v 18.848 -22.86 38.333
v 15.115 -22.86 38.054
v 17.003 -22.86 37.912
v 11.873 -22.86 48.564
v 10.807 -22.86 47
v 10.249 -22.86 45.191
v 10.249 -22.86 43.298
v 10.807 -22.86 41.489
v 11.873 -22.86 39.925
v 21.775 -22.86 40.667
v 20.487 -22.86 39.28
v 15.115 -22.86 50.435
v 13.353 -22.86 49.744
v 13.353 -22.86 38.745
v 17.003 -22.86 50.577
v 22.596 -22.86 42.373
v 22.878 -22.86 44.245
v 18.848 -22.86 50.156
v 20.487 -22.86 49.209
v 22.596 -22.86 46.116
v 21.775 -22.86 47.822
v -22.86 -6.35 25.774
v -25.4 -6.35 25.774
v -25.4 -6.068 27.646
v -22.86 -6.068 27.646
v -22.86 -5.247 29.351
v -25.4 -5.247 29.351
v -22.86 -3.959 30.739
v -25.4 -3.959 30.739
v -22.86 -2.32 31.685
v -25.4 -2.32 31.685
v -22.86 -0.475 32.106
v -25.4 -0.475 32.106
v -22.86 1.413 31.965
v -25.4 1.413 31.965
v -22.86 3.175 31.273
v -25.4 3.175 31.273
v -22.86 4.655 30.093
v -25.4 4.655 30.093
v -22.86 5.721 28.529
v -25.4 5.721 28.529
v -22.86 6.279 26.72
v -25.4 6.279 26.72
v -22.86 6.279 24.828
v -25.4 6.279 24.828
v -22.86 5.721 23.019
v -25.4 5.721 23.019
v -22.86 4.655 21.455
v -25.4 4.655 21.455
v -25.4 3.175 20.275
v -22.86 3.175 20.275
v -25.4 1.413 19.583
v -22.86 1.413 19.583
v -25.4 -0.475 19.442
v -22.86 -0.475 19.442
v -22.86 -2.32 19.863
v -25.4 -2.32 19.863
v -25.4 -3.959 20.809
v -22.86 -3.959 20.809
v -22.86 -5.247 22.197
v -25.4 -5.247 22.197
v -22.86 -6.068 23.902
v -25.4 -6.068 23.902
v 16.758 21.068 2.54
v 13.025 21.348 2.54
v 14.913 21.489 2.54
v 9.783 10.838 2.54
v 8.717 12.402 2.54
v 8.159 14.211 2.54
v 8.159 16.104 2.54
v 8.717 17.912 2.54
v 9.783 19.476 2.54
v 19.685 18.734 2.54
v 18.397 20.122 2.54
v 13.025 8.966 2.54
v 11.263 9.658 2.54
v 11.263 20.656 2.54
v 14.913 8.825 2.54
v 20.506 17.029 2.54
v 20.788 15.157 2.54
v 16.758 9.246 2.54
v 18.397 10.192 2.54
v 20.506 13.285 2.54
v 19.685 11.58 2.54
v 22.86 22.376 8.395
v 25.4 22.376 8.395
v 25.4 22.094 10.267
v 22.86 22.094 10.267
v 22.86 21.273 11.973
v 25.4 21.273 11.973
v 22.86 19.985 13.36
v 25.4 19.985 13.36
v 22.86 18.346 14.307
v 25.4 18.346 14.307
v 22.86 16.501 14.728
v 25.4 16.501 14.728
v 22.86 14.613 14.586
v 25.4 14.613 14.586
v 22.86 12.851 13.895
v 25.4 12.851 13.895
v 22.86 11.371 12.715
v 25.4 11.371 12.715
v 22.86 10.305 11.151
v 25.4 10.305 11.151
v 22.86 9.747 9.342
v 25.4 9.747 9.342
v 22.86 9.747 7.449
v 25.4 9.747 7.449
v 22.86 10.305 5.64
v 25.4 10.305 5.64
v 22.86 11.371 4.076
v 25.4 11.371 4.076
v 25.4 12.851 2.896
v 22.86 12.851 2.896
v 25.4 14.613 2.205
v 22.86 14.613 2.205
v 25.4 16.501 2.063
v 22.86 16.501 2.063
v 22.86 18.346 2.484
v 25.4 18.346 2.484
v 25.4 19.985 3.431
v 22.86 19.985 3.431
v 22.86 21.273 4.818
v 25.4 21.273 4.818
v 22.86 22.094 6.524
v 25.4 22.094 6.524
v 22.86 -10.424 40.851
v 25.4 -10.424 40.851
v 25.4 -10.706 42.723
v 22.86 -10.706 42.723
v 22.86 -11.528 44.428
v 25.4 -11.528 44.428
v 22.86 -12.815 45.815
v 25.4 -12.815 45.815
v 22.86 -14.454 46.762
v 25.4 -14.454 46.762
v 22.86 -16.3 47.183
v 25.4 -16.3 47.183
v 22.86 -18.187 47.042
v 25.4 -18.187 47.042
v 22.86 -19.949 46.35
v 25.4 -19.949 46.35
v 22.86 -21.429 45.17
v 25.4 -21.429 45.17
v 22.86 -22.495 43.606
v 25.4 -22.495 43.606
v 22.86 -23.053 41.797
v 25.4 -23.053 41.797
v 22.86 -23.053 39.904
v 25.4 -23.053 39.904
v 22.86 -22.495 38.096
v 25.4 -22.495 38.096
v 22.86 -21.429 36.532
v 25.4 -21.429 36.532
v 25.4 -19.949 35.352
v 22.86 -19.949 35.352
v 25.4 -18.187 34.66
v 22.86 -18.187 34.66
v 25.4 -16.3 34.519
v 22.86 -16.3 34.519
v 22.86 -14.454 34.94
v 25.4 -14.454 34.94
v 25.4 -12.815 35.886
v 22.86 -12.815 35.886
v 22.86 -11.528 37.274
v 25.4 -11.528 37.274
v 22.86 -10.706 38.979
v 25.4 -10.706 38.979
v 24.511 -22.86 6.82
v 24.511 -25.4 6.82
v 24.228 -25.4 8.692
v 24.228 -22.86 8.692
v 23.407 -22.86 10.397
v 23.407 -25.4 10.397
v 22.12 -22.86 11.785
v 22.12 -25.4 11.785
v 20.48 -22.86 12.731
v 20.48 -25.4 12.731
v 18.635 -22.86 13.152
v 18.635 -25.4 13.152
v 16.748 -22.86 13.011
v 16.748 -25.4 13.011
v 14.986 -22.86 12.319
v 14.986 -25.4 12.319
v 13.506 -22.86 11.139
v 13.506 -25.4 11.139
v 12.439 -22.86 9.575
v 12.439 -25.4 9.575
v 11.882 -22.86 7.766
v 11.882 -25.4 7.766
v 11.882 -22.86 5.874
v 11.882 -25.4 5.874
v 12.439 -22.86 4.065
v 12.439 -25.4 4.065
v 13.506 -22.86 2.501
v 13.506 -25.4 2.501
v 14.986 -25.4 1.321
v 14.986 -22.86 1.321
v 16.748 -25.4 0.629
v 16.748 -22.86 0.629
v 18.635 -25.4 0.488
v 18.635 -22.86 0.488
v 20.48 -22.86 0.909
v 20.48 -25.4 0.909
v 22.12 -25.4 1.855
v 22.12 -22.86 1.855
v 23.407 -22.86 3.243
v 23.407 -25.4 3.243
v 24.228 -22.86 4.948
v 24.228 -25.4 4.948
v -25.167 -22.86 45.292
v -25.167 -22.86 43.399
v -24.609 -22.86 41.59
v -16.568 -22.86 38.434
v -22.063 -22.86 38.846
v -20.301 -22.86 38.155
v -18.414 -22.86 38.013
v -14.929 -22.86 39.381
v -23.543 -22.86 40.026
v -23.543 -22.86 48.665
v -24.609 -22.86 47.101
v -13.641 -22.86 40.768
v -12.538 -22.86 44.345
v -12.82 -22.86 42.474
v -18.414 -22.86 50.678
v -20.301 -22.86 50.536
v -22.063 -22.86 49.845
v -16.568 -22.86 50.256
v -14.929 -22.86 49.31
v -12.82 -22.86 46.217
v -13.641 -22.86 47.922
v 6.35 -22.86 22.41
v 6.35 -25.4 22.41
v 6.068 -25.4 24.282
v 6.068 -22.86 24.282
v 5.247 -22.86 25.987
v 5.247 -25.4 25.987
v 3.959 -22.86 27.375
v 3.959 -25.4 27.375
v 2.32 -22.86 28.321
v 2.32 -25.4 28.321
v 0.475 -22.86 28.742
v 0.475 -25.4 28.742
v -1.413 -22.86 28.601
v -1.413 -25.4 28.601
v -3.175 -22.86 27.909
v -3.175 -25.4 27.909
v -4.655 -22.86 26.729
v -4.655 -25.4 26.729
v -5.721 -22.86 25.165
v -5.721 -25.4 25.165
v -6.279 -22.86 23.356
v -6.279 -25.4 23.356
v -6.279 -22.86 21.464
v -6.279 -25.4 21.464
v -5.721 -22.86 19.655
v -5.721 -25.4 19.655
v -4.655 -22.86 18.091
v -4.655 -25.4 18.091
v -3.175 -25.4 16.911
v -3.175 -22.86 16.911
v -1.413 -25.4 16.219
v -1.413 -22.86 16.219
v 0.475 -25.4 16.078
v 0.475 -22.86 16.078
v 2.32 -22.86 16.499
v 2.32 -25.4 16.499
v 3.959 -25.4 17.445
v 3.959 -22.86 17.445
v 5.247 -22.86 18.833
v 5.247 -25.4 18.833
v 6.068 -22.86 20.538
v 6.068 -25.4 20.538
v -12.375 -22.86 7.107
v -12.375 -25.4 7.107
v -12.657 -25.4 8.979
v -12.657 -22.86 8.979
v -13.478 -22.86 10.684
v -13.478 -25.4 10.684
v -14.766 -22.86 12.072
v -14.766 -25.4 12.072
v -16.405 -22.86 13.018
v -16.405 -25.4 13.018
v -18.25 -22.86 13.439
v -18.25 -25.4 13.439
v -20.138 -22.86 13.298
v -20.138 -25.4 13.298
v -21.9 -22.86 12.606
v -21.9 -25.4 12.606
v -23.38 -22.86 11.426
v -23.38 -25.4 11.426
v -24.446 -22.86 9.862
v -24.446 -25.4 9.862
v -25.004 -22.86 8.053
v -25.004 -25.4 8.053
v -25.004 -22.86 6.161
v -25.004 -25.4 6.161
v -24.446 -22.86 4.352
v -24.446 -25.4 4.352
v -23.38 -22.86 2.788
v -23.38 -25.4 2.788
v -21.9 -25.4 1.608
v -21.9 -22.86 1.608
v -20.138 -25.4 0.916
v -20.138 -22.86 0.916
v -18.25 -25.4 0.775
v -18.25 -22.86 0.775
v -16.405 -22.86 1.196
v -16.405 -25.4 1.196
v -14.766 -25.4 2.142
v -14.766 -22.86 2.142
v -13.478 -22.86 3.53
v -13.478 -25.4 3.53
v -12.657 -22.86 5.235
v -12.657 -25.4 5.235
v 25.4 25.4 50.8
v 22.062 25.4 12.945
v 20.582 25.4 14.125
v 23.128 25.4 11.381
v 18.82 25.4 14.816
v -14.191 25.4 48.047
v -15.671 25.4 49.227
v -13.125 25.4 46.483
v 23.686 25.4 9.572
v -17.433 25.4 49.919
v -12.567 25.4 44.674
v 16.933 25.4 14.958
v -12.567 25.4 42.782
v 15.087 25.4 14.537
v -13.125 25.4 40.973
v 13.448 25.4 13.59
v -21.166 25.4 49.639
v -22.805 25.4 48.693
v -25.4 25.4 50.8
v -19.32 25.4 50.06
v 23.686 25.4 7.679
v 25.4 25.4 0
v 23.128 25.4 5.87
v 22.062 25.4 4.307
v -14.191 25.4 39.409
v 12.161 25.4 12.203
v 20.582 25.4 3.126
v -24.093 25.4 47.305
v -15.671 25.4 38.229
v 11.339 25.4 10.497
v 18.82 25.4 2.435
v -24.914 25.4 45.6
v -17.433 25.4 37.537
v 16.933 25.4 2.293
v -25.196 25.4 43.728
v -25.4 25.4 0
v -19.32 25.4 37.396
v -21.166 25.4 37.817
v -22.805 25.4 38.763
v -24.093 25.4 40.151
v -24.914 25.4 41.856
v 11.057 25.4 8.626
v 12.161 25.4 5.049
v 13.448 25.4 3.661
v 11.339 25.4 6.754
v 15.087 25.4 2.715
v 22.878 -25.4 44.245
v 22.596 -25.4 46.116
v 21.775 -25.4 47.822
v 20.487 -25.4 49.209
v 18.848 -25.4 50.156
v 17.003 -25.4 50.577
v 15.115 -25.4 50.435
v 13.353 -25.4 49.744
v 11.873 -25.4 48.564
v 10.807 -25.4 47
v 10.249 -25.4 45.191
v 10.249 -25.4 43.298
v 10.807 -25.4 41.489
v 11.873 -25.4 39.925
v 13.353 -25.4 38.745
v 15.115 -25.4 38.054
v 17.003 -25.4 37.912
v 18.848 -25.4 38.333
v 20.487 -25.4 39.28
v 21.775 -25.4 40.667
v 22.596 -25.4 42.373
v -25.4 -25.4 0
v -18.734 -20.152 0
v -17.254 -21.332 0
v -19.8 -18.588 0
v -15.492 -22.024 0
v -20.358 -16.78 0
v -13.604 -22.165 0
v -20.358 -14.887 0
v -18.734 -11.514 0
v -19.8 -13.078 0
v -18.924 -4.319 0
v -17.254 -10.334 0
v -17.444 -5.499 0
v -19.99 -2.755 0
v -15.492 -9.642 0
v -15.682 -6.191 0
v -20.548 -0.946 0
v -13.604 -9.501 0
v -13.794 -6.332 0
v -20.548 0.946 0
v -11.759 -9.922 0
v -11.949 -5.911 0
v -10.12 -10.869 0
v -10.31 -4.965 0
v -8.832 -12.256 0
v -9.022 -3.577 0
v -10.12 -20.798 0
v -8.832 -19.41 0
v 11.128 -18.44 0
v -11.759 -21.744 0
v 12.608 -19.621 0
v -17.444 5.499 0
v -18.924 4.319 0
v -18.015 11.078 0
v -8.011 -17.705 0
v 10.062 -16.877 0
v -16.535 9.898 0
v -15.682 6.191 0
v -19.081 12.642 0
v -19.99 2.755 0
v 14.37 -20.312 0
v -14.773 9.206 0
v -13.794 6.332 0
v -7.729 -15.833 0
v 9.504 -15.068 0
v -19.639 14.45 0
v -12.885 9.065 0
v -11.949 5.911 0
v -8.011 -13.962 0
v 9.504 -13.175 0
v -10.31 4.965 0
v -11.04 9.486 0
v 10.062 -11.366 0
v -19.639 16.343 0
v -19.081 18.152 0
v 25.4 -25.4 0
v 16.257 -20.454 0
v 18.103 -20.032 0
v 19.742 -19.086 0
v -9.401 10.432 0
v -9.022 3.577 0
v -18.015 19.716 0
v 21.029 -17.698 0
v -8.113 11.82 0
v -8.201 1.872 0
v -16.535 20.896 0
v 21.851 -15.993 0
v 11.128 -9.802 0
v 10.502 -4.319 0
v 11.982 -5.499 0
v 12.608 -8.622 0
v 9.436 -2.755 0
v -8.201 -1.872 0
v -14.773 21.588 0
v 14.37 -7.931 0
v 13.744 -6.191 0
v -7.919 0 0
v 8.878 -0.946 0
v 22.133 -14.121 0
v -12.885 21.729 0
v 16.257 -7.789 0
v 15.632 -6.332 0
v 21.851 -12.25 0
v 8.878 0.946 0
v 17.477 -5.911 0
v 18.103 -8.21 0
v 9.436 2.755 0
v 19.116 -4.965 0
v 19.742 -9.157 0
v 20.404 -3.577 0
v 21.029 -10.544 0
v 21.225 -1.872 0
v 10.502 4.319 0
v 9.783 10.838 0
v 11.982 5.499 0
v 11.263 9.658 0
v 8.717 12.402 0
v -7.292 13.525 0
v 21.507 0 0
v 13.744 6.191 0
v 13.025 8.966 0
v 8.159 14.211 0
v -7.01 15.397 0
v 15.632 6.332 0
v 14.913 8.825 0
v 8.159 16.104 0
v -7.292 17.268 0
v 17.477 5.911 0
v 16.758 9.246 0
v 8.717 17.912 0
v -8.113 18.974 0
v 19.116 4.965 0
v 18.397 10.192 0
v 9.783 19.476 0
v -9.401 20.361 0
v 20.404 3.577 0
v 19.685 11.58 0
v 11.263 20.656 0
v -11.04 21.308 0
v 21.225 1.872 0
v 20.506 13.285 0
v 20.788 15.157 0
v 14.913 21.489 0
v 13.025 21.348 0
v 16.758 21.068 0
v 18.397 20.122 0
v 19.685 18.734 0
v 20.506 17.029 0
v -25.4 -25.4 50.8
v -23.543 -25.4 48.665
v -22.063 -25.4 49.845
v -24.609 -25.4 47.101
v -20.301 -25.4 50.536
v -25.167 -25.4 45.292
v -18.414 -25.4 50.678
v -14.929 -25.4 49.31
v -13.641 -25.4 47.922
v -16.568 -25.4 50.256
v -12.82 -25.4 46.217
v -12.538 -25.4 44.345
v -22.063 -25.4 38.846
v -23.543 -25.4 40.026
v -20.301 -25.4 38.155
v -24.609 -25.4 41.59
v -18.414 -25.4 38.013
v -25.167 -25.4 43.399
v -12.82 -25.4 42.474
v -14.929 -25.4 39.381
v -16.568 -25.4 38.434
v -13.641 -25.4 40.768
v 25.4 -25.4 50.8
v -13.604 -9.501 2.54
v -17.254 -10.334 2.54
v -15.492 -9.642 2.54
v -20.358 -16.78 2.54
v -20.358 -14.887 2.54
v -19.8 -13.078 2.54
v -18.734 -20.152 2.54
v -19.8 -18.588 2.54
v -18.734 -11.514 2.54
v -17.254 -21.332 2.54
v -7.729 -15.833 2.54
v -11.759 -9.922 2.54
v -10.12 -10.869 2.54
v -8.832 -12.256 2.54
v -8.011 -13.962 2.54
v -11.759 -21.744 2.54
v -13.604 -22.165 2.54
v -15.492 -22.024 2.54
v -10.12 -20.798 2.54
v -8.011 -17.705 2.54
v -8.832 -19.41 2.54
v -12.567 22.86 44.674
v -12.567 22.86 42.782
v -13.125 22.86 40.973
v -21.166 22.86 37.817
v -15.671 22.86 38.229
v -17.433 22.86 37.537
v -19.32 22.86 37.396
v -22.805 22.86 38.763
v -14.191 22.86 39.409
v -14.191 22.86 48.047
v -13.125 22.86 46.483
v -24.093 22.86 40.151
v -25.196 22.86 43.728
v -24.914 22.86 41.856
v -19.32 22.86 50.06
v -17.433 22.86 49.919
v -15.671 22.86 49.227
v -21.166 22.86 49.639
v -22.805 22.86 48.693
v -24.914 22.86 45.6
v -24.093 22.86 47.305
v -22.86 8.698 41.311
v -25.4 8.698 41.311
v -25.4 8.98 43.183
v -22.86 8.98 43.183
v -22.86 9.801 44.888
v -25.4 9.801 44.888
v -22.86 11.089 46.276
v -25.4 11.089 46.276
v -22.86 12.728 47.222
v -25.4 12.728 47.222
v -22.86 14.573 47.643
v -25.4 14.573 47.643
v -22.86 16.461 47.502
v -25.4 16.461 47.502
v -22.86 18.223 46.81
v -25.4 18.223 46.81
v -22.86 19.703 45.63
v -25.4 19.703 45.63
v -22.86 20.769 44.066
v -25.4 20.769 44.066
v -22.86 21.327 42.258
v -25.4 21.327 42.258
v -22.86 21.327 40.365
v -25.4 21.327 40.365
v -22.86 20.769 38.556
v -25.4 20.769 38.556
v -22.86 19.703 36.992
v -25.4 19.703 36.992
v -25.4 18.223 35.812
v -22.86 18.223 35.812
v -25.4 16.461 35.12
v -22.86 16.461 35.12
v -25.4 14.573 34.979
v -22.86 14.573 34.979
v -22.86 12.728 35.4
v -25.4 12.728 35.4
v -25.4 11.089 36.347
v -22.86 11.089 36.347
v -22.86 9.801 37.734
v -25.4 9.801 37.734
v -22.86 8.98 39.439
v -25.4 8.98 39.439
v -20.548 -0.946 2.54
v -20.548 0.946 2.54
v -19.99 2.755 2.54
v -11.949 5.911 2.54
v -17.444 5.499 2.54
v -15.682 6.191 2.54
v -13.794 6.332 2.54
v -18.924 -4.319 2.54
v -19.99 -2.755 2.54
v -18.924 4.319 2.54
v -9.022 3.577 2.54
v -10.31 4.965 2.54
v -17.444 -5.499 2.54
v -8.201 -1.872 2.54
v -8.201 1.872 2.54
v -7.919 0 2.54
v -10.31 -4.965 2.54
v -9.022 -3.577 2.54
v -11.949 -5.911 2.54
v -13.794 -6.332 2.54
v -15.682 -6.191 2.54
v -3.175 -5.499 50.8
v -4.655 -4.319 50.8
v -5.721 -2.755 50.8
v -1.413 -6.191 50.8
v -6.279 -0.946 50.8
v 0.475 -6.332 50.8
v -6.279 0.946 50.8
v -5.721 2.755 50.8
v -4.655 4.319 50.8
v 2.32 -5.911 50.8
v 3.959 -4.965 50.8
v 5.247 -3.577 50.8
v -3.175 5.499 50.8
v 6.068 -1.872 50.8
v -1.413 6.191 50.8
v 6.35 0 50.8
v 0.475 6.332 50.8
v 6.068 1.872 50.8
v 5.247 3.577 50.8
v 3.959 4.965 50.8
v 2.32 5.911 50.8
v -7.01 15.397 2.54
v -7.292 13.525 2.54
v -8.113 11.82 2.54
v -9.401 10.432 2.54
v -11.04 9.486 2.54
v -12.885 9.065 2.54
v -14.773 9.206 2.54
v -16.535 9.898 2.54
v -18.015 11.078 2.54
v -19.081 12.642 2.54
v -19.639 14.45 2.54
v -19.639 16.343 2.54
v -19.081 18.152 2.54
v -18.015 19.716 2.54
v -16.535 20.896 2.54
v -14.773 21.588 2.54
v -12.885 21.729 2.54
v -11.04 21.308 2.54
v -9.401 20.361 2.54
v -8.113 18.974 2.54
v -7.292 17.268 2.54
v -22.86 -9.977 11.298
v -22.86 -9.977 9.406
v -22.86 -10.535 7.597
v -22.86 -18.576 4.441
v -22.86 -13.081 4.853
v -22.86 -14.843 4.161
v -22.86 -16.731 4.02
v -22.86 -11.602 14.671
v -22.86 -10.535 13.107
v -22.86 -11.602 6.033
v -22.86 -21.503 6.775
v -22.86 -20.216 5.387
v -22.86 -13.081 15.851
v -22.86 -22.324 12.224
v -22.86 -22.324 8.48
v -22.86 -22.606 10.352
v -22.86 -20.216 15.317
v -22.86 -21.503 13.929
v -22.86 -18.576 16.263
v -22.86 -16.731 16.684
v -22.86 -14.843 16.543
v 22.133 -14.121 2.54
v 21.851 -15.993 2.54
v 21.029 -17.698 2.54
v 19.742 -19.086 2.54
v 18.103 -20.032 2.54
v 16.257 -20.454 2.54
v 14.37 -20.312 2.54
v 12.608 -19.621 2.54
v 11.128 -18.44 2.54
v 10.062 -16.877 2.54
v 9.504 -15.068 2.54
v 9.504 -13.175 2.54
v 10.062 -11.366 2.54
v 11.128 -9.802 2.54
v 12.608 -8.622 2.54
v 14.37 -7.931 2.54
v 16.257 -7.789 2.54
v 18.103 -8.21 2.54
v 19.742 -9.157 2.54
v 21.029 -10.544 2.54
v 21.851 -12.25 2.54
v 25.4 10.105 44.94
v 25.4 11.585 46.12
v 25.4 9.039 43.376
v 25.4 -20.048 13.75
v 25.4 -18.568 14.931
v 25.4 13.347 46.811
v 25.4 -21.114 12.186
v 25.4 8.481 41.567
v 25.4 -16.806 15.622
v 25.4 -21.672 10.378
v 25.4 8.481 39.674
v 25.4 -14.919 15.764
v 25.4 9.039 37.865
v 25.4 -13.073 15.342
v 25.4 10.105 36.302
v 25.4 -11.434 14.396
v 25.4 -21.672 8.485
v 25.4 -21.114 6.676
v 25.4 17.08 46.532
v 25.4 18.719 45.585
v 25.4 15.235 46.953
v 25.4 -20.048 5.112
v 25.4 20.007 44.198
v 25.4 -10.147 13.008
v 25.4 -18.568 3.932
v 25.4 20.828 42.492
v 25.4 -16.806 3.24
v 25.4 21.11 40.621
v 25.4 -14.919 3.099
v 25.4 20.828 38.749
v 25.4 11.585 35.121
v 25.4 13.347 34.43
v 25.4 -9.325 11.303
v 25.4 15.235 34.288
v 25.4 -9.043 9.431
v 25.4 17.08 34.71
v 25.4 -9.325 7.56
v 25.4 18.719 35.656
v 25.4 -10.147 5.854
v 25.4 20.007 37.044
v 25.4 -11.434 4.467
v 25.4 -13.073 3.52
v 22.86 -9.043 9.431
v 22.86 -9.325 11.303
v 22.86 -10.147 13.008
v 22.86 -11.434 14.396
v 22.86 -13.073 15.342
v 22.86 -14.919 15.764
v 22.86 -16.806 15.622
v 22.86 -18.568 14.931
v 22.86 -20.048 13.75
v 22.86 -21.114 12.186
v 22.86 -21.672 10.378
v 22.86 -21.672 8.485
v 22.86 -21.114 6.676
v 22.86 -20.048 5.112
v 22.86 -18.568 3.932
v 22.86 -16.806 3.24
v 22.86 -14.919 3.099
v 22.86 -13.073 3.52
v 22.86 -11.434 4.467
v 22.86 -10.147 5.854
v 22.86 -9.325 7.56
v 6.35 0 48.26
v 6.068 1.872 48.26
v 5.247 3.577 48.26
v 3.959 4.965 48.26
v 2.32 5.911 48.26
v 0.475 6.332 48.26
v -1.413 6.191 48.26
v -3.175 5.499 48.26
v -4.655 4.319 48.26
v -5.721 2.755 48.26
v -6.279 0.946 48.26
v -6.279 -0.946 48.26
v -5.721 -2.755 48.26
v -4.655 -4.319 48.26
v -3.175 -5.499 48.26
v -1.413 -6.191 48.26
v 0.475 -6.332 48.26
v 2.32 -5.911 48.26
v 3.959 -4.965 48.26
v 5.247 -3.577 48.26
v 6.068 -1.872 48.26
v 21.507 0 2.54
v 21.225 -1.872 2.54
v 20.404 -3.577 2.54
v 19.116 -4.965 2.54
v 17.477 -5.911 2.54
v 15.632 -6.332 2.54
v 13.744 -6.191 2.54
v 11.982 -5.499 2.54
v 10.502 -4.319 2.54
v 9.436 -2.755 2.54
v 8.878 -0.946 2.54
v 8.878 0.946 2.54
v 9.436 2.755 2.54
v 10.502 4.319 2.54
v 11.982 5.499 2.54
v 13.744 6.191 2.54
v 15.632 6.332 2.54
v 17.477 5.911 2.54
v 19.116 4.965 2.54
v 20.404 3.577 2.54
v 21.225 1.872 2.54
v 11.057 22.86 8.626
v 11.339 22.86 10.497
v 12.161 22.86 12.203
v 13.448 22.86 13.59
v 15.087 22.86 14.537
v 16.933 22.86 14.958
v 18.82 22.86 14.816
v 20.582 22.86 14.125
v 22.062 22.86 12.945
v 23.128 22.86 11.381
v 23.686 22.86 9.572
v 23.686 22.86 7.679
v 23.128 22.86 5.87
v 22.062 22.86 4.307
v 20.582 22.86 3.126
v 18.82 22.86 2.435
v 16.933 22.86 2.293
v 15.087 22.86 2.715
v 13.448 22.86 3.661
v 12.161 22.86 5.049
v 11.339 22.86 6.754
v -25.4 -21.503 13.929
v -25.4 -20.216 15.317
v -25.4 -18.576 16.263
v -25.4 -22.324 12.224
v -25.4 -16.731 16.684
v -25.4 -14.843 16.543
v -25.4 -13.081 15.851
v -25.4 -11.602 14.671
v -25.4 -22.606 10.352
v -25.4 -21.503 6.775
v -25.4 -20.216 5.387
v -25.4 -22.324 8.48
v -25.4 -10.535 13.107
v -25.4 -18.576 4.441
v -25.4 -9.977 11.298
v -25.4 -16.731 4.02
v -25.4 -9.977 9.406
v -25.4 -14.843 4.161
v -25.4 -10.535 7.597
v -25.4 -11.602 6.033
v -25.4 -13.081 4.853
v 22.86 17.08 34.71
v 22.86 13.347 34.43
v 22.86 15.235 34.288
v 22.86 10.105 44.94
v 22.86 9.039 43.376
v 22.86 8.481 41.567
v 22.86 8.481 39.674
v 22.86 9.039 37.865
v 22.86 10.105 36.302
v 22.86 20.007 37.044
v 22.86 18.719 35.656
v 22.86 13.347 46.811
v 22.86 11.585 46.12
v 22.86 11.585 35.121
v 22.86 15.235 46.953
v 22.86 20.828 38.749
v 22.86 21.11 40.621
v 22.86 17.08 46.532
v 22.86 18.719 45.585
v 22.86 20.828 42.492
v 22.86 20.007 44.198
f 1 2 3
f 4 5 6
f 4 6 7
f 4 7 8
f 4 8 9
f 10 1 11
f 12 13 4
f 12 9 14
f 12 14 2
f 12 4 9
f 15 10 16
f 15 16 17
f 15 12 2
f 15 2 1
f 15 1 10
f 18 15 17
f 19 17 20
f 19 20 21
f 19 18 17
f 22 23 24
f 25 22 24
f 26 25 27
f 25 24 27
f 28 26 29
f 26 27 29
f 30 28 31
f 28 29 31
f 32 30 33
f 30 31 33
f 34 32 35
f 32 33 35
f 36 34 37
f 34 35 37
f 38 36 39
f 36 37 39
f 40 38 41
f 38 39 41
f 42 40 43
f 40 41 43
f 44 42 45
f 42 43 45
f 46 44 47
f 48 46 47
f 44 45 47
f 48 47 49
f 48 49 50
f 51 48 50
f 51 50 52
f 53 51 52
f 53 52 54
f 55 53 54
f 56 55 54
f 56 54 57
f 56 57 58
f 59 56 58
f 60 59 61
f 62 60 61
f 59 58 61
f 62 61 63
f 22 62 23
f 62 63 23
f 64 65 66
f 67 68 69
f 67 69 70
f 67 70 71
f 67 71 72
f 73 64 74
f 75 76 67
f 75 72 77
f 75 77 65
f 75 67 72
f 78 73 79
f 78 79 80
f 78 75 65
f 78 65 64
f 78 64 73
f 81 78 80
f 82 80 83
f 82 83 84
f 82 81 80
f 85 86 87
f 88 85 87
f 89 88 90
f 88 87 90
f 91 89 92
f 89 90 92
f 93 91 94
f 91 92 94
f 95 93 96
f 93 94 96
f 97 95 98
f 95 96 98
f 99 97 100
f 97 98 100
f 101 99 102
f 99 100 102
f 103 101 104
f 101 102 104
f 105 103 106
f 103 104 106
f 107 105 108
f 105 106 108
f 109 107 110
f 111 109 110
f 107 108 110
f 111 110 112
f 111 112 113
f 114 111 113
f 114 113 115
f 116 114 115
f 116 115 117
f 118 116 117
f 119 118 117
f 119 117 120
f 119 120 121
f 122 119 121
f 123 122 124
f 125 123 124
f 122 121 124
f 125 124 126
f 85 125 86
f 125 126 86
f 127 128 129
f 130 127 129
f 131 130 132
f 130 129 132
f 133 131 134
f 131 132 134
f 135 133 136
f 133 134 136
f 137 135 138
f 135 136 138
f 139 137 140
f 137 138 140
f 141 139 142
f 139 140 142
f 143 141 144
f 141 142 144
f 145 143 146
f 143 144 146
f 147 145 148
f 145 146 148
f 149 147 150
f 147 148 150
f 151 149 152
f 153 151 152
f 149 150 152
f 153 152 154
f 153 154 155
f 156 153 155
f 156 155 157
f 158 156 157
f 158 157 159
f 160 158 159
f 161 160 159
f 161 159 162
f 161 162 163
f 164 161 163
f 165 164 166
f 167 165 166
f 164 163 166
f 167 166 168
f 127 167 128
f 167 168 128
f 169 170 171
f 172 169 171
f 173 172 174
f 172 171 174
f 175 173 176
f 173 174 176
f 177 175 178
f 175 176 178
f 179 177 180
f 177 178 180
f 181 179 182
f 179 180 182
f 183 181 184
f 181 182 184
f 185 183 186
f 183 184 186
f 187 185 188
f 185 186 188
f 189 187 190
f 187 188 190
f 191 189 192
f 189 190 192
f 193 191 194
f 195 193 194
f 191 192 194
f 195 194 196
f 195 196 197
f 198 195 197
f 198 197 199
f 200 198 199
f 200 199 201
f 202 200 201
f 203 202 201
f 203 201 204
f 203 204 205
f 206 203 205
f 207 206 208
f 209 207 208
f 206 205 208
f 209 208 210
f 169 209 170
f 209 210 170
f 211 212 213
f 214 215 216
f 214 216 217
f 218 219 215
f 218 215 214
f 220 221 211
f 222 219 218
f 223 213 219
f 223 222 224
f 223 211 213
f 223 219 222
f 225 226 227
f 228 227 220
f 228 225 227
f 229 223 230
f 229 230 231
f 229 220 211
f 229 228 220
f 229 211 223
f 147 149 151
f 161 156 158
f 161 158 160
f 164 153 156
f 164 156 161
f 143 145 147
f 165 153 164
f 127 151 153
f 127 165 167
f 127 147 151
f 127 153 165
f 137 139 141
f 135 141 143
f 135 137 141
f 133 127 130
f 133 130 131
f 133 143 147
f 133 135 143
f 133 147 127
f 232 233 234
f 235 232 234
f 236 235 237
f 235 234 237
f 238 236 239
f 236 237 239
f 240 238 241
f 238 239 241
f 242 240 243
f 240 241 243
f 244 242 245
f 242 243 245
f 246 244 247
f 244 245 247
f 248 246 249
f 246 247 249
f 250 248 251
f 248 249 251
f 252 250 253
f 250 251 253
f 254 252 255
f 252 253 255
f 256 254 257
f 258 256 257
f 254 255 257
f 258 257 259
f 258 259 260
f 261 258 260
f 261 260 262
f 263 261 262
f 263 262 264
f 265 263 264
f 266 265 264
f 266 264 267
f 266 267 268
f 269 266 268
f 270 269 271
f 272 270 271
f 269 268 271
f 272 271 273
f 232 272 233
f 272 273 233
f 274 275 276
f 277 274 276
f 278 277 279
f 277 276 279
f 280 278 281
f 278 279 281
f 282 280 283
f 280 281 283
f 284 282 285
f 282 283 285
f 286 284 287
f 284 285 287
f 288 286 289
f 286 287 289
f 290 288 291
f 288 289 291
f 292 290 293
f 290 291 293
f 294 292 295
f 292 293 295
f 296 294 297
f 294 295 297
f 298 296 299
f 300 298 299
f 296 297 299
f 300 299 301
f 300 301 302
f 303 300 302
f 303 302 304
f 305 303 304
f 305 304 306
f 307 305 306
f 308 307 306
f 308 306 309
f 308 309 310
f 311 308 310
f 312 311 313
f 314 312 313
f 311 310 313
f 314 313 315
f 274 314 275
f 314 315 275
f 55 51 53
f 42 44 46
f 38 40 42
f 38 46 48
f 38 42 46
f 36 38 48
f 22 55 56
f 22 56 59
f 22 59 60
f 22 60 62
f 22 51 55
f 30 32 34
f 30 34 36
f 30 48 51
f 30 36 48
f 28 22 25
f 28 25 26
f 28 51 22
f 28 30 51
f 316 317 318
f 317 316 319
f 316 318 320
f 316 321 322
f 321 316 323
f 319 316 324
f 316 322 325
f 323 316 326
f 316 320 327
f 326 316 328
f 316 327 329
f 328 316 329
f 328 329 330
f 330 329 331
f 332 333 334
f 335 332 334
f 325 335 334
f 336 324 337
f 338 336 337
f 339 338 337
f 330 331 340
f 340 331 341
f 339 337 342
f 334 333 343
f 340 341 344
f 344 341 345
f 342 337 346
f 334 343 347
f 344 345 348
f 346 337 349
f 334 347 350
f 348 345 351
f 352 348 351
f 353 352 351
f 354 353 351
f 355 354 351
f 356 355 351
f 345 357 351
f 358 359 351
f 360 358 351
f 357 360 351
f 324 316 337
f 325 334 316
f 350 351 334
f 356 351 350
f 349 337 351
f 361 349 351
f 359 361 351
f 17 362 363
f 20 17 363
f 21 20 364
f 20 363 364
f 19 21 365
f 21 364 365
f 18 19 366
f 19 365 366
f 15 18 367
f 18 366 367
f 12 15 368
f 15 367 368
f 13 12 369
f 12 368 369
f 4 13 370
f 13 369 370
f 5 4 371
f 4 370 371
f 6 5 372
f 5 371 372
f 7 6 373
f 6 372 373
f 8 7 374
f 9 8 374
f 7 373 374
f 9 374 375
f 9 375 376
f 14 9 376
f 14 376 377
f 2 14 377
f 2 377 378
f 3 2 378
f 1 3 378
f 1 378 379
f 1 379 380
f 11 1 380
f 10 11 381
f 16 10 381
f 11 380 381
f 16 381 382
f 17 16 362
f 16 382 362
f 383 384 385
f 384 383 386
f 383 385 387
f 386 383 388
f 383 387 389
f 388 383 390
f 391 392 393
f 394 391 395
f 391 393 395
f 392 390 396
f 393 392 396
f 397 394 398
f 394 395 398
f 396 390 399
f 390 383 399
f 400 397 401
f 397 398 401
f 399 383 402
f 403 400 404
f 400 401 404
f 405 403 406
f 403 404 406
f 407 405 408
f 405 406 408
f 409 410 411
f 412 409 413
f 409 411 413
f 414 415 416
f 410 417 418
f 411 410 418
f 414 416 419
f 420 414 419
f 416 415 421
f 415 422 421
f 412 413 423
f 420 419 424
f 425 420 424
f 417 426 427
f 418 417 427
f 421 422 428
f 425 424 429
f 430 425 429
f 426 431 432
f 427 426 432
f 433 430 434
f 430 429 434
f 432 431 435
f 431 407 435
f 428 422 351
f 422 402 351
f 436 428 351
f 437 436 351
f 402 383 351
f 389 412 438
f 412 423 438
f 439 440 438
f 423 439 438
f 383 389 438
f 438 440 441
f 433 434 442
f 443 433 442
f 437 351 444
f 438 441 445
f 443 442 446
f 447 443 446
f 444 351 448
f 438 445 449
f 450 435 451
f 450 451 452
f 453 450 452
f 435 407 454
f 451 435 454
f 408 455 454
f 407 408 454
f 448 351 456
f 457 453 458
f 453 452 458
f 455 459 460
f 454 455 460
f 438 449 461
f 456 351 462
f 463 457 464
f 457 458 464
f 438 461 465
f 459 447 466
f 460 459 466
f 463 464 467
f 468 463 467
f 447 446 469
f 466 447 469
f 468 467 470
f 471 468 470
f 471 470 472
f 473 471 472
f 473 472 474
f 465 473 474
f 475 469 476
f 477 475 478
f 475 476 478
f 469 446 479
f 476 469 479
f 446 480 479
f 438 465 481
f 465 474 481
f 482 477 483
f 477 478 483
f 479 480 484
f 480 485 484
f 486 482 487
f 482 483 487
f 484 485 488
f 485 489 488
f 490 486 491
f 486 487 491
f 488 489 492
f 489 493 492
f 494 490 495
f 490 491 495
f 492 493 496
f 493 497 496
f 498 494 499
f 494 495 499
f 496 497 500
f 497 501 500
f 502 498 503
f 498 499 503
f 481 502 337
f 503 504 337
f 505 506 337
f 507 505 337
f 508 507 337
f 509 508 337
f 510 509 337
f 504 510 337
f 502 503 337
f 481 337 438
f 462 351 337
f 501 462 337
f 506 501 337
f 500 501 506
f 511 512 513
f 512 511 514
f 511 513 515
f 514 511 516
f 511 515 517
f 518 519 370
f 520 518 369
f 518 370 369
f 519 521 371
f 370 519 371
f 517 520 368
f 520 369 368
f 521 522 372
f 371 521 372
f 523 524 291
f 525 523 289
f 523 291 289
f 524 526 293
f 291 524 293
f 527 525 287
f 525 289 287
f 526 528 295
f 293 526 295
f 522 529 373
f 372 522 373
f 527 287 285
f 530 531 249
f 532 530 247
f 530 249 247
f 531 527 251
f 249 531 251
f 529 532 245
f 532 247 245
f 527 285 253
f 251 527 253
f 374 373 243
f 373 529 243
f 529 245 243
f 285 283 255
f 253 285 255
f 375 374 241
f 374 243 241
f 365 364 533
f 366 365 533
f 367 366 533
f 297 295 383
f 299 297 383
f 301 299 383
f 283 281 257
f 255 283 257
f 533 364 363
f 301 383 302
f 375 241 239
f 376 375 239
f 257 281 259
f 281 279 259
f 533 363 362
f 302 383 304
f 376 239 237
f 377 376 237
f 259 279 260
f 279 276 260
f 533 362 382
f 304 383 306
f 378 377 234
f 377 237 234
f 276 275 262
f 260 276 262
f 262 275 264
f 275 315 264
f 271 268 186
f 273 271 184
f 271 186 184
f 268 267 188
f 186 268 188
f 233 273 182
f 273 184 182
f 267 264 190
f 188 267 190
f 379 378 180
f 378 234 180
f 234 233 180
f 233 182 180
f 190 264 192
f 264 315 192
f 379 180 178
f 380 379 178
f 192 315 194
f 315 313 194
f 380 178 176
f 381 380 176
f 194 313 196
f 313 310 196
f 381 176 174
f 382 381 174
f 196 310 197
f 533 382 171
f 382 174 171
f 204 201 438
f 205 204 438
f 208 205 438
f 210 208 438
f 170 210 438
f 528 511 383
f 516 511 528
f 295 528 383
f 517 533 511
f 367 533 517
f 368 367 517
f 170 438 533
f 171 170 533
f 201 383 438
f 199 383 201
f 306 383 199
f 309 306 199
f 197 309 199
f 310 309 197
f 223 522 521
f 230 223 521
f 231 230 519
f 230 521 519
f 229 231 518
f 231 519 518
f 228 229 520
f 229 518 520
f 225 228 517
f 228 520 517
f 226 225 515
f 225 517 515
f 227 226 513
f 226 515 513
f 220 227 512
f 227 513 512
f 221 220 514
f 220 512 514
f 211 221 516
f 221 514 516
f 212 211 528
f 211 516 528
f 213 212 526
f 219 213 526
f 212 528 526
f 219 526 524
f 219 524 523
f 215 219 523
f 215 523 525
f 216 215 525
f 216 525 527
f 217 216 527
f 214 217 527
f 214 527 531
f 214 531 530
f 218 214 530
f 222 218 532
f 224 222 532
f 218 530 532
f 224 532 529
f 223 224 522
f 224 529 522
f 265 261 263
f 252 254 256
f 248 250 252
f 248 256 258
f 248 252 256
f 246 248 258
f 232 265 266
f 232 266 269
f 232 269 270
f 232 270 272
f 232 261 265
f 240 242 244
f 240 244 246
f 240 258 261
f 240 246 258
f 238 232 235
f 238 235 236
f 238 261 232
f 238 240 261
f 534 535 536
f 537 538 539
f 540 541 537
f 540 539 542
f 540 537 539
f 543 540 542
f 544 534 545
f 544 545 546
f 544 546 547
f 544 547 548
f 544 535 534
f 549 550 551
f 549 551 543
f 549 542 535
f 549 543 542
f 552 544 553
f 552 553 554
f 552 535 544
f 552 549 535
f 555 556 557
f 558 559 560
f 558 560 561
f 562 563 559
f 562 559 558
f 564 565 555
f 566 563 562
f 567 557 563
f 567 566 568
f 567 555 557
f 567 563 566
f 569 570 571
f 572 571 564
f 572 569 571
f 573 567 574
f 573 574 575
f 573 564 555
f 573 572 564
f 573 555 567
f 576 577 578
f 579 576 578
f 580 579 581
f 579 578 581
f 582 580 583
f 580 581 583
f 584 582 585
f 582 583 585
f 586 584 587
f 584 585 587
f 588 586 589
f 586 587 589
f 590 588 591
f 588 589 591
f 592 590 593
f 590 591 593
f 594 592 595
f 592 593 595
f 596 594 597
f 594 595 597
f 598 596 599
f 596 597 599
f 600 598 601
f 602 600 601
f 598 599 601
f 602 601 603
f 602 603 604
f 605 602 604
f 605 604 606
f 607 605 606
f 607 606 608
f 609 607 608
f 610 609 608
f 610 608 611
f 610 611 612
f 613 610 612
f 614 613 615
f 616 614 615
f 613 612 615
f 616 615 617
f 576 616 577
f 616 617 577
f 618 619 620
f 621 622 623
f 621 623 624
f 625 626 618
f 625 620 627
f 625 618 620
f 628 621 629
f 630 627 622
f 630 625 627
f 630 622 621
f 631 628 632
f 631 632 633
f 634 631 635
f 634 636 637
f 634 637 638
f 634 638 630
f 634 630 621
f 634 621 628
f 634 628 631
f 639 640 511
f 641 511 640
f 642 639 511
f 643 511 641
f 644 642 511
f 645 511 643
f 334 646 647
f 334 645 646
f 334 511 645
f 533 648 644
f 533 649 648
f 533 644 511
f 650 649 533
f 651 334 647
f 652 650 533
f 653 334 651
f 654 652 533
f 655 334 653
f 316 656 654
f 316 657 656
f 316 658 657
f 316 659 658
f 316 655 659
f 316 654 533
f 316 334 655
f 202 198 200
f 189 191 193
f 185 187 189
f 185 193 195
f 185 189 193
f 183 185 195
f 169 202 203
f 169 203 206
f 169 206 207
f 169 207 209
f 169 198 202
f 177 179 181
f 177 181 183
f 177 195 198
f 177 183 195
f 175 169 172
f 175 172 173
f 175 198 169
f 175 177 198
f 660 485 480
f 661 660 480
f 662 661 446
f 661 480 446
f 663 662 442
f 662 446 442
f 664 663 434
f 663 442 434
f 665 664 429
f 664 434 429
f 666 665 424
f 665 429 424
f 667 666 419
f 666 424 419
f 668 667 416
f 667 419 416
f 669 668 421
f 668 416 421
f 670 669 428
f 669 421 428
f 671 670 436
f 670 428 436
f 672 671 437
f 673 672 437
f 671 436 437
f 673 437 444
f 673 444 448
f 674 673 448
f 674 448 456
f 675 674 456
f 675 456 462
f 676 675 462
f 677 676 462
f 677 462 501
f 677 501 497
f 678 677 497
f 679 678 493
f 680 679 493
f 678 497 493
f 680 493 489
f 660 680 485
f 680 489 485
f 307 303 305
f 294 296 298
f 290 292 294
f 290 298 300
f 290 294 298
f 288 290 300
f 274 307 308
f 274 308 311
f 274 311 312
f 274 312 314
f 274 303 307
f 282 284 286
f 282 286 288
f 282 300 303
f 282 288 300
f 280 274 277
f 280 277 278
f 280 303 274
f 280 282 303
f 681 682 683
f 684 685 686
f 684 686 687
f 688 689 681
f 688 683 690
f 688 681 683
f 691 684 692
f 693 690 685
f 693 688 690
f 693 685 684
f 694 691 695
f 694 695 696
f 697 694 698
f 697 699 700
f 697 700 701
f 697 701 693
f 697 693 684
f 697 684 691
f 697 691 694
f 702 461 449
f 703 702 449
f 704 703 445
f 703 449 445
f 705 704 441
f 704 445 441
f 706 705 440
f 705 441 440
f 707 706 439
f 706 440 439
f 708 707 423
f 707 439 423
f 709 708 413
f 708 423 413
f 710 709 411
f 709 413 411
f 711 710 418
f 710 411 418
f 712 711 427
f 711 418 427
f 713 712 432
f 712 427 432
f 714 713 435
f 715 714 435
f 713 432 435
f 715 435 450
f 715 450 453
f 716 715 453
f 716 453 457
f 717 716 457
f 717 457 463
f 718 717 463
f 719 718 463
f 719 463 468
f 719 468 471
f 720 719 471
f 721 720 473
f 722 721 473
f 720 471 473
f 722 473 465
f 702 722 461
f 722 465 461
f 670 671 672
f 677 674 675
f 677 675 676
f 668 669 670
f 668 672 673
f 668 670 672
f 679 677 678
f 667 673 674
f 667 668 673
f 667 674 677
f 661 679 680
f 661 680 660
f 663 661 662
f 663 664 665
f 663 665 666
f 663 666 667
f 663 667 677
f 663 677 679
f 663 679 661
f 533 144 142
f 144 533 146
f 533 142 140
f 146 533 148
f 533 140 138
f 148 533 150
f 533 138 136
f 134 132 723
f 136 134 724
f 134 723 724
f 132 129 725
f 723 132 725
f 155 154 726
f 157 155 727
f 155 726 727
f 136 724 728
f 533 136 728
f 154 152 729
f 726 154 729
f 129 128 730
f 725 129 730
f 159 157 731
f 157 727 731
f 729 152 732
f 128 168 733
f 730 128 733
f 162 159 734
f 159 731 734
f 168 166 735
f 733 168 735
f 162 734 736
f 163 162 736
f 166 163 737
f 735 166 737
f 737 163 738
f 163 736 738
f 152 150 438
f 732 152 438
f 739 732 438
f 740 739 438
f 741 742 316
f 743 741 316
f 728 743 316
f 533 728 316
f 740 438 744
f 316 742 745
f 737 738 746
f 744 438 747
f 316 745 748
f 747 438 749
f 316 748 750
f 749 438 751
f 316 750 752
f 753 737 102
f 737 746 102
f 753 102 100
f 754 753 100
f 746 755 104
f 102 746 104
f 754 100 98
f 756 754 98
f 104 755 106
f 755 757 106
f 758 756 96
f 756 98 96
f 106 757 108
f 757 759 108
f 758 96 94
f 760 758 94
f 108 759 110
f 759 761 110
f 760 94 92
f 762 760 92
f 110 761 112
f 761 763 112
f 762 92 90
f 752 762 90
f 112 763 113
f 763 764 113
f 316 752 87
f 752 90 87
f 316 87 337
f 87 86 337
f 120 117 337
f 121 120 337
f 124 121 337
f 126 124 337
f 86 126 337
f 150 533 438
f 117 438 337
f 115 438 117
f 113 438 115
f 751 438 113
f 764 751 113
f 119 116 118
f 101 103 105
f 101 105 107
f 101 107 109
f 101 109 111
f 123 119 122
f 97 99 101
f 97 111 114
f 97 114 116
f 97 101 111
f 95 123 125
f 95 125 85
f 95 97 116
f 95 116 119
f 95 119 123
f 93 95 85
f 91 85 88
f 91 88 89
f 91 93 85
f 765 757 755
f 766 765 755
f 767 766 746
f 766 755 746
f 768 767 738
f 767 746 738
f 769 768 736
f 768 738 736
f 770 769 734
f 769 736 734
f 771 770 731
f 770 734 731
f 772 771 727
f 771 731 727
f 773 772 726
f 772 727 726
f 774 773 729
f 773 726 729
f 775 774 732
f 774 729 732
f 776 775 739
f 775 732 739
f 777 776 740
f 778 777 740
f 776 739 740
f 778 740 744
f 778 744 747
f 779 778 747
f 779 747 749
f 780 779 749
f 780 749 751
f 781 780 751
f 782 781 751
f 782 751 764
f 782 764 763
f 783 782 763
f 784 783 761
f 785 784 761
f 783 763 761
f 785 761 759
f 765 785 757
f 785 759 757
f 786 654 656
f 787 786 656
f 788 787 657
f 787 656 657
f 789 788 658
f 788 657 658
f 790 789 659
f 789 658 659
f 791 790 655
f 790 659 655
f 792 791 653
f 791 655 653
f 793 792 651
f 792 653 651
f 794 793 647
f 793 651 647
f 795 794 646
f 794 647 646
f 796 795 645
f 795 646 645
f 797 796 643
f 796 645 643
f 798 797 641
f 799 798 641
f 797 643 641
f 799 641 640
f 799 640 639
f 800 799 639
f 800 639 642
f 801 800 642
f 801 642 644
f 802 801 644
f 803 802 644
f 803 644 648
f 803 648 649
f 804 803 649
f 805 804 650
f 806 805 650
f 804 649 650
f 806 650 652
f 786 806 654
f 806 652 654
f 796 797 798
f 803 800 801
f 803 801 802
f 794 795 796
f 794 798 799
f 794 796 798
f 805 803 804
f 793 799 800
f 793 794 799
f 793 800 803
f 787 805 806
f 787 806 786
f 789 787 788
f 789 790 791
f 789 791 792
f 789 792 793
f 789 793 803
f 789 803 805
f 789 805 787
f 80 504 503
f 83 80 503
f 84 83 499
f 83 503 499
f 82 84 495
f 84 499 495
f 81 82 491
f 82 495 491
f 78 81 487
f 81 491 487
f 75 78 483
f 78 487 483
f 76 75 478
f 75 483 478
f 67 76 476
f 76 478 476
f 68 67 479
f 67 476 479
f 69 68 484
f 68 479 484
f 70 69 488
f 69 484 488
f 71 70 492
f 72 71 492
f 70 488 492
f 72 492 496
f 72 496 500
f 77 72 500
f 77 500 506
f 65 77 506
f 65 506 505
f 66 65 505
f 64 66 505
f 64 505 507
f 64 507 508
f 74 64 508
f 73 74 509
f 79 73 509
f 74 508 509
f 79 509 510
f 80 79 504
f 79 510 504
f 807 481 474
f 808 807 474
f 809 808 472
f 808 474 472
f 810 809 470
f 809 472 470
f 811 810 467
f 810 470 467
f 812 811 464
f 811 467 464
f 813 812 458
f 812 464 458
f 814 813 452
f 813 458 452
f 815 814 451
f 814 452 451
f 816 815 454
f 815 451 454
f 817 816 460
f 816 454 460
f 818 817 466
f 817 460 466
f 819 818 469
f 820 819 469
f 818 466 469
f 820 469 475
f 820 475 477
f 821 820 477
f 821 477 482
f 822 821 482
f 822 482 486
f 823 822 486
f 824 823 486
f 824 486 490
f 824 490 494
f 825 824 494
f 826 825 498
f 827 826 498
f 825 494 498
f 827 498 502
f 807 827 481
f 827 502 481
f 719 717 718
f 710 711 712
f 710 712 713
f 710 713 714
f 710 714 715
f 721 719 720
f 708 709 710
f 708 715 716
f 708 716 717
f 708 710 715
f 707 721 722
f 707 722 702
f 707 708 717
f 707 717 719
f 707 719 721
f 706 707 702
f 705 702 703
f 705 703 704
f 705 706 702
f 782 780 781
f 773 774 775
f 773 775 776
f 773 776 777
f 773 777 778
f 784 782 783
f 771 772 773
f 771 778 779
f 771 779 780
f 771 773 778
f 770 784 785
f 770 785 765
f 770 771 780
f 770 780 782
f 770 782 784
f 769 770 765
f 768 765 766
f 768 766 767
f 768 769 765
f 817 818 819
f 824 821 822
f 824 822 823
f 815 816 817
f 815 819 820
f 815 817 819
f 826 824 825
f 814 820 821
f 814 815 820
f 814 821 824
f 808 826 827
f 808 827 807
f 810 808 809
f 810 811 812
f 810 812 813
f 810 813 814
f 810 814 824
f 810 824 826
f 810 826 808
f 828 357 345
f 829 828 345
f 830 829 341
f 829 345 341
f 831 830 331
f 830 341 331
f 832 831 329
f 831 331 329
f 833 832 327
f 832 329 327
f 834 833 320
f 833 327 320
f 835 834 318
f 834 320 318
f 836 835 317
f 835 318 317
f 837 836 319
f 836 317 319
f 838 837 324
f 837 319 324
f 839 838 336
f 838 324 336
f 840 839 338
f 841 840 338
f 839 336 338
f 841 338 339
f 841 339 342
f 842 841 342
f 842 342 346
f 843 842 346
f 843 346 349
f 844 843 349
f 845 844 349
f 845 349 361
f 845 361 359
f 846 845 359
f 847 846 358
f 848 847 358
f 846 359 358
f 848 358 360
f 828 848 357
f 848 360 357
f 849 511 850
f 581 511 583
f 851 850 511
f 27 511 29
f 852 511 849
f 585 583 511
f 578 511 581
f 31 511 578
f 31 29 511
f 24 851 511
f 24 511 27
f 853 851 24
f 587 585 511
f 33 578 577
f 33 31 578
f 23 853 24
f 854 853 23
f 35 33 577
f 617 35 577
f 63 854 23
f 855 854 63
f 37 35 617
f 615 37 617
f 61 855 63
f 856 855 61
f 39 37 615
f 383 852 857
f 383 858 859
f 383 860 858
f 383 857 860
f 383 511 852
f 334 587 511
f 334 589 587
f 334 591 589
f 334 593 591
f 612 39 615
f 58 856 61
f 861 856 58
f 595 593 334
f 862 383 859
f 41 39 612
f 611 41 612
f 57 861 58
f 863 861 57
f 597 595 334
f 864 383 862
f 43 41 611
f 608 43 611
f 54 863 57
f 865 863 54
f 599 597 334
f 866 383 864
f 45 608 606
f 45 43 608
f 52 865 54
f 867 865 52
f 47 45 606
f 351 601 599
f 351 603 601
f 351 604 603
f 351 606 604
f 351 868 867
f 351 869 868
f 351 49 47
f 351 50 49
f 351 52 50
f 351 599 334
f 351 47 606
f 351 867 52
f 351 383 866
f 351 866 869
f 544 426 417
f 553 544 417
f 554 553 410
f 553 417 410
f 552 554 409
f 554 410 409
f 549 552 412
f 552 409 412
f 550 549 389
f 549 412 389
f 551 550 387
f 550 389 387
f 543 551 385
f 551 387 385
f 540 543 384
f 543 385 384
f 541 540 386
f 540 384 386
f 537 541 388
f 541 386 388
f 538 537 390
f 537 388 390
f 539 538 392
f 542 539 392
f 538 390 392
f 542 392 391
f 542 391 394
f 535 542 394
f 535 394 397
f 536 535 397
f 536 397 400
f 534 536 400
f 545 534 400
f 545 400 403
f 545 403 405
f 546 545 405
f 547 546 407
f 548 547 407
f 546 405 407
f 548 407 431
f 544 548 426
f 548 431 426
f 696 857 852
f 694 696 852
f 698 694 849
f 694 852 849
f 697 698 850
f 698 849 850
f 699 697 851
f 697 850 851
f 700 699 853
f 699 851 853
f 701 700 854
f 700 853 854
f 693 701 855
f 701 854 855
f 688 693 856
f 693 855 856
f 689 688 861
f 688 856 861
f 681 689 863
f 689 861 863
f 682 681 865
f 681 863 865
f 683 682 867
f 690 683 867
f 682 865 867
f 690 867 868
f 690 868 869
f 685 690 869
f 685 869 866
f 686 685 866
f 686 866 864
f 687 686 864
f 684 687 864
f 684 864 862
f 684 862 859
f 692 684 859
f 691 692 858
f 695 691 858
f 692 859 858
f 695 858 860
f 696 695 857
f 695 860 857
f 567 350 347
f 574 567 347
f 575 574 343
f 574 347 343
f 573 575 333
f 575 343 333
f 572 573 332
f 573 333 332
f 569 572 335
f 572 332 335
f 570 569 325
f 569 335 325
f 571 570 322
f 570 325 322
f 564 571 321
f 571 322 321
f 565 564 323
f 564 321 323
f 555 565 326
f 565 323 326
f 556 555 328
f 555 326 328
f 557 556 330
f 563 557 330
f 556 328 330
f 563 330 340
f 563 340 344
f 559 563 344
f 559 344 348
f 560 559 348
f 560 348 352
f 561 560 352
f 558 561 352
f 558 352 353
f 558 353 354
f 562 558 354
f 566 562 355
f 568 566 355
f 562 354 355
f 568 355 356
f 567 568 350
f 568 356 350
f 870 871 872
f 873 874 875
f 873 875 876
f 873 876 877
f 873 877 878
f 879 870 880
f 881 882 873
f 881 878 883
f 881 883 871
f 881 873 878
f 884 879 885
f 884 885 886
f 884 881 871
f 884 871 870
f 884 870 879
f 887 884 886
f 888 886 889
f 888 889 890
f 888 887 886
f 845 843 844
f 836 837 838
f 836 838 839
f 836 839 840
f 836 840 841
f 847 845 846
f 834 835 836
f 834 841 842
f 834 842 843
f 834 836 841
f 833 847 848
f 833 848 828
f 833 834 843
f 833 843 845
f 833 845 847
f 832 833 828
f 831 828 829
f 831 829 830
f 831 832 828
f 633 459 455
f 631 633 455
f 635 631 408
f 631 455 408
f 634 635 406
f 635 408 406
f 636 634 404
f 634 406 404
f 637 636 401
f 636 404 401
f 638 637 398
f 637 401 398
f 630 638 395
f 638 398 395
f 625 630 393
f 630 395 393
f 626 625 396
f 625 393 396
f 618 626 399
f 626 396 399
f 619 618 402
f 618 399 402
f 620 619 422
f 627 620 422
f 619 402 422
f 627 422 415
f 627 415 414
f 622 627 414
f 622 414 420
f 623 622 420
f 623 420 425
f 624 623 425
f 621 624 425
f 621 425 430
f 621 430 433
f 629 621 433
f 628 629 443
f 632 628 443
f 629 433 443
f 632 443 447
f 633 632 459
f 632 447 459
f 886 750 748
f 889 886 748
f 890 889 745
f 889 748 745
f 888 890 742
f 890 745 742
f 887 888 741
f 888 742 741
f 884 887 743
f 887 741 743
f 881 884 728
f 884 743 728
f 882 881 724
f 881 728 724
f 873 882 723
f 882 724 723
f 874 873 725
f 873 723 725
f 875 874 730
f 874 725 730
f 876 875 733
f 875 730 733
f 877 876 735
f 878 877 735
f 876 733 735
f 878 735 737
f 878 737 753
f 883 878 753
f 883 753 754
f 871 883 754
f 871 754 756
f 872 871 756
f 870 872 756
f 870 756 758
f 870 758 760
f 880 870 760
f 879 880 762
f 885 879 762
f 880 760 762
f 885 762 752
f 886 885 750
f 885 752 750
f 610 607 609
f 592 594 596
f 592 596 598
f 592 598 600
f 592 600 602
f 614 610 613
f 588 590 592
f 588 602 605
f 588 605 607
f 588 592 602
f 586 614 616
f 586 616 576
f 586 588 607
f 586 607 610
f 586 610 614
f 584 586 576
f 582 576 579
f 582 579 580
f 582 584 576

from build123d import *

# Parameters (mm, degrees)
F0_W      = 25.4
F0_H      = 50.8
F1_DEPTH  = 50.8
F2_R      = 6.35
F3_DEPTH  = 2.54
F4_R      = 6.35
F5_DEPTH  = 2.54
F6_R      = 6.35
F7_DEPTH  = 2.54
F8_R      = 6.35
F9_DEPTH  = 2.54
F10_R     = 6.35
F11_DEPTH = 2.54
F12_R     = 6.35
F13_DEPTH = 2.54


with BuildPart() as f1:
    # F0 (on Top) → F1 (new body)
    with BuildSketch(Plane.XY):
        with Locations((-12.7, 0)):
            Rectangle(F0_W, F0_H)
        with Locations((12.7, 0)):
            Rectangle(F0_W, F0_H)
    extrude(amount=F1_DEPTH)

    # F2 (on face) → F3 (cut)
    with BuildSketch(Plane.XY.offset(50.8)):
        Circle(F2_R)
    extrude(amount=-F3_DEPTH, mode=Mode.SUBTRACT)

    # F4 (on face) → F5 (cut)
    with BuildSketch(Plane(origin=(0, 0, 0), x_dir=(1, 0, 0), z_dir=(0, 0, -1))):
        with Locations((15.7828163356, 14.1213936731)):
            Circle(F4_R)
        with Locations((-14.078758657, 15.8332046121)):
            Circle(F4_R)
        with Locations((15.1571258903, 0)):
            Circle(F4_R)
        with Locations((-14.2689589411, 0)):
            Circle(F4_R)
        with Locations((-13.359840028, -15.3967663646)):
            Circle(F4_R)
        with Locations((14.4382100552, -15.1571286842)):
            Circle(F4_R)
    extrude(amount=-F5_DEPTH, mode=Mode.SUBTRACT)

    # F6 (on face) → F7 (cut)
    with BuildSketch(Plane.XZ.offset(25.4)):
        with Locations((18.1605778635, 6.8199974485)):
            Circle(F6_R)
        with Locations((-18.7246706337, 7.1070431732)):
            Circle(F6_R)
        with Locations((0, 22.4099811167)):
            Circle(F6_R)
        with Locations((16.5282599628, 44.2445091903)):
            Circle(F6_R)
        with Locations((-18.8880376518, 44.3454124033)):
            Circle(F6_R)
    extrude(amount=-F7_DEPTH, mode=Mode.SUBTRACT)

    # F8 (on face) → F9 (cut)
    with BuildSketch(Plane.YZ.offset(25.4)):
        with Locations((-16.7743396014, 40.8508107066)):
            Circle(F8_R)
        with Locations((14.7602735087, 40.6206287444)):
            Circle(F8_R)
        with Locations((-15.3932608664, 9.4312885776)):
            Circle(F8_R)
        with Locations((16.0262603313, 8.395479992)):
            Circle(F8_R)
    extrude(amount=-F9_DEPTH, mode=Mode.SUBTRACT)

    # F10 (on face) → F11 (cut)
    with BuildSketch(Plane(origin=(-25.4, 0, 0), x_dir=(0, -1, 0), z_dir=(-1, 0, 0))):
        with Locations((0, 25.7740411907)):
            Circle(F10_R)
        with Locations((16.2564348429, 10.3520061821)):
            Circle(F10_R)
        with Locations((-15.0479944423, 41.3111671805)):
            Circle(F10_R)
    extrude(amount=-F11_DEPTH, mode=Mode.SUBTRACT)

    # F12 (on face) → F13 (cut)
    with BuildSketch(Plane(origin=(0, 25.4, 0), x_dir=(-1, 0, 0), z_dir=(0, 1, 0))):
        with Locations((-17.407335341, 8.6256600916)):
            Circle(F12_R)
        with Locations((18.8459586352, 43.7280572951)):
            Circle(F12_R)
    extrude(amount=-F13_DEPTH, mode=Mode.SUBTRACT)


solid = f1.part
